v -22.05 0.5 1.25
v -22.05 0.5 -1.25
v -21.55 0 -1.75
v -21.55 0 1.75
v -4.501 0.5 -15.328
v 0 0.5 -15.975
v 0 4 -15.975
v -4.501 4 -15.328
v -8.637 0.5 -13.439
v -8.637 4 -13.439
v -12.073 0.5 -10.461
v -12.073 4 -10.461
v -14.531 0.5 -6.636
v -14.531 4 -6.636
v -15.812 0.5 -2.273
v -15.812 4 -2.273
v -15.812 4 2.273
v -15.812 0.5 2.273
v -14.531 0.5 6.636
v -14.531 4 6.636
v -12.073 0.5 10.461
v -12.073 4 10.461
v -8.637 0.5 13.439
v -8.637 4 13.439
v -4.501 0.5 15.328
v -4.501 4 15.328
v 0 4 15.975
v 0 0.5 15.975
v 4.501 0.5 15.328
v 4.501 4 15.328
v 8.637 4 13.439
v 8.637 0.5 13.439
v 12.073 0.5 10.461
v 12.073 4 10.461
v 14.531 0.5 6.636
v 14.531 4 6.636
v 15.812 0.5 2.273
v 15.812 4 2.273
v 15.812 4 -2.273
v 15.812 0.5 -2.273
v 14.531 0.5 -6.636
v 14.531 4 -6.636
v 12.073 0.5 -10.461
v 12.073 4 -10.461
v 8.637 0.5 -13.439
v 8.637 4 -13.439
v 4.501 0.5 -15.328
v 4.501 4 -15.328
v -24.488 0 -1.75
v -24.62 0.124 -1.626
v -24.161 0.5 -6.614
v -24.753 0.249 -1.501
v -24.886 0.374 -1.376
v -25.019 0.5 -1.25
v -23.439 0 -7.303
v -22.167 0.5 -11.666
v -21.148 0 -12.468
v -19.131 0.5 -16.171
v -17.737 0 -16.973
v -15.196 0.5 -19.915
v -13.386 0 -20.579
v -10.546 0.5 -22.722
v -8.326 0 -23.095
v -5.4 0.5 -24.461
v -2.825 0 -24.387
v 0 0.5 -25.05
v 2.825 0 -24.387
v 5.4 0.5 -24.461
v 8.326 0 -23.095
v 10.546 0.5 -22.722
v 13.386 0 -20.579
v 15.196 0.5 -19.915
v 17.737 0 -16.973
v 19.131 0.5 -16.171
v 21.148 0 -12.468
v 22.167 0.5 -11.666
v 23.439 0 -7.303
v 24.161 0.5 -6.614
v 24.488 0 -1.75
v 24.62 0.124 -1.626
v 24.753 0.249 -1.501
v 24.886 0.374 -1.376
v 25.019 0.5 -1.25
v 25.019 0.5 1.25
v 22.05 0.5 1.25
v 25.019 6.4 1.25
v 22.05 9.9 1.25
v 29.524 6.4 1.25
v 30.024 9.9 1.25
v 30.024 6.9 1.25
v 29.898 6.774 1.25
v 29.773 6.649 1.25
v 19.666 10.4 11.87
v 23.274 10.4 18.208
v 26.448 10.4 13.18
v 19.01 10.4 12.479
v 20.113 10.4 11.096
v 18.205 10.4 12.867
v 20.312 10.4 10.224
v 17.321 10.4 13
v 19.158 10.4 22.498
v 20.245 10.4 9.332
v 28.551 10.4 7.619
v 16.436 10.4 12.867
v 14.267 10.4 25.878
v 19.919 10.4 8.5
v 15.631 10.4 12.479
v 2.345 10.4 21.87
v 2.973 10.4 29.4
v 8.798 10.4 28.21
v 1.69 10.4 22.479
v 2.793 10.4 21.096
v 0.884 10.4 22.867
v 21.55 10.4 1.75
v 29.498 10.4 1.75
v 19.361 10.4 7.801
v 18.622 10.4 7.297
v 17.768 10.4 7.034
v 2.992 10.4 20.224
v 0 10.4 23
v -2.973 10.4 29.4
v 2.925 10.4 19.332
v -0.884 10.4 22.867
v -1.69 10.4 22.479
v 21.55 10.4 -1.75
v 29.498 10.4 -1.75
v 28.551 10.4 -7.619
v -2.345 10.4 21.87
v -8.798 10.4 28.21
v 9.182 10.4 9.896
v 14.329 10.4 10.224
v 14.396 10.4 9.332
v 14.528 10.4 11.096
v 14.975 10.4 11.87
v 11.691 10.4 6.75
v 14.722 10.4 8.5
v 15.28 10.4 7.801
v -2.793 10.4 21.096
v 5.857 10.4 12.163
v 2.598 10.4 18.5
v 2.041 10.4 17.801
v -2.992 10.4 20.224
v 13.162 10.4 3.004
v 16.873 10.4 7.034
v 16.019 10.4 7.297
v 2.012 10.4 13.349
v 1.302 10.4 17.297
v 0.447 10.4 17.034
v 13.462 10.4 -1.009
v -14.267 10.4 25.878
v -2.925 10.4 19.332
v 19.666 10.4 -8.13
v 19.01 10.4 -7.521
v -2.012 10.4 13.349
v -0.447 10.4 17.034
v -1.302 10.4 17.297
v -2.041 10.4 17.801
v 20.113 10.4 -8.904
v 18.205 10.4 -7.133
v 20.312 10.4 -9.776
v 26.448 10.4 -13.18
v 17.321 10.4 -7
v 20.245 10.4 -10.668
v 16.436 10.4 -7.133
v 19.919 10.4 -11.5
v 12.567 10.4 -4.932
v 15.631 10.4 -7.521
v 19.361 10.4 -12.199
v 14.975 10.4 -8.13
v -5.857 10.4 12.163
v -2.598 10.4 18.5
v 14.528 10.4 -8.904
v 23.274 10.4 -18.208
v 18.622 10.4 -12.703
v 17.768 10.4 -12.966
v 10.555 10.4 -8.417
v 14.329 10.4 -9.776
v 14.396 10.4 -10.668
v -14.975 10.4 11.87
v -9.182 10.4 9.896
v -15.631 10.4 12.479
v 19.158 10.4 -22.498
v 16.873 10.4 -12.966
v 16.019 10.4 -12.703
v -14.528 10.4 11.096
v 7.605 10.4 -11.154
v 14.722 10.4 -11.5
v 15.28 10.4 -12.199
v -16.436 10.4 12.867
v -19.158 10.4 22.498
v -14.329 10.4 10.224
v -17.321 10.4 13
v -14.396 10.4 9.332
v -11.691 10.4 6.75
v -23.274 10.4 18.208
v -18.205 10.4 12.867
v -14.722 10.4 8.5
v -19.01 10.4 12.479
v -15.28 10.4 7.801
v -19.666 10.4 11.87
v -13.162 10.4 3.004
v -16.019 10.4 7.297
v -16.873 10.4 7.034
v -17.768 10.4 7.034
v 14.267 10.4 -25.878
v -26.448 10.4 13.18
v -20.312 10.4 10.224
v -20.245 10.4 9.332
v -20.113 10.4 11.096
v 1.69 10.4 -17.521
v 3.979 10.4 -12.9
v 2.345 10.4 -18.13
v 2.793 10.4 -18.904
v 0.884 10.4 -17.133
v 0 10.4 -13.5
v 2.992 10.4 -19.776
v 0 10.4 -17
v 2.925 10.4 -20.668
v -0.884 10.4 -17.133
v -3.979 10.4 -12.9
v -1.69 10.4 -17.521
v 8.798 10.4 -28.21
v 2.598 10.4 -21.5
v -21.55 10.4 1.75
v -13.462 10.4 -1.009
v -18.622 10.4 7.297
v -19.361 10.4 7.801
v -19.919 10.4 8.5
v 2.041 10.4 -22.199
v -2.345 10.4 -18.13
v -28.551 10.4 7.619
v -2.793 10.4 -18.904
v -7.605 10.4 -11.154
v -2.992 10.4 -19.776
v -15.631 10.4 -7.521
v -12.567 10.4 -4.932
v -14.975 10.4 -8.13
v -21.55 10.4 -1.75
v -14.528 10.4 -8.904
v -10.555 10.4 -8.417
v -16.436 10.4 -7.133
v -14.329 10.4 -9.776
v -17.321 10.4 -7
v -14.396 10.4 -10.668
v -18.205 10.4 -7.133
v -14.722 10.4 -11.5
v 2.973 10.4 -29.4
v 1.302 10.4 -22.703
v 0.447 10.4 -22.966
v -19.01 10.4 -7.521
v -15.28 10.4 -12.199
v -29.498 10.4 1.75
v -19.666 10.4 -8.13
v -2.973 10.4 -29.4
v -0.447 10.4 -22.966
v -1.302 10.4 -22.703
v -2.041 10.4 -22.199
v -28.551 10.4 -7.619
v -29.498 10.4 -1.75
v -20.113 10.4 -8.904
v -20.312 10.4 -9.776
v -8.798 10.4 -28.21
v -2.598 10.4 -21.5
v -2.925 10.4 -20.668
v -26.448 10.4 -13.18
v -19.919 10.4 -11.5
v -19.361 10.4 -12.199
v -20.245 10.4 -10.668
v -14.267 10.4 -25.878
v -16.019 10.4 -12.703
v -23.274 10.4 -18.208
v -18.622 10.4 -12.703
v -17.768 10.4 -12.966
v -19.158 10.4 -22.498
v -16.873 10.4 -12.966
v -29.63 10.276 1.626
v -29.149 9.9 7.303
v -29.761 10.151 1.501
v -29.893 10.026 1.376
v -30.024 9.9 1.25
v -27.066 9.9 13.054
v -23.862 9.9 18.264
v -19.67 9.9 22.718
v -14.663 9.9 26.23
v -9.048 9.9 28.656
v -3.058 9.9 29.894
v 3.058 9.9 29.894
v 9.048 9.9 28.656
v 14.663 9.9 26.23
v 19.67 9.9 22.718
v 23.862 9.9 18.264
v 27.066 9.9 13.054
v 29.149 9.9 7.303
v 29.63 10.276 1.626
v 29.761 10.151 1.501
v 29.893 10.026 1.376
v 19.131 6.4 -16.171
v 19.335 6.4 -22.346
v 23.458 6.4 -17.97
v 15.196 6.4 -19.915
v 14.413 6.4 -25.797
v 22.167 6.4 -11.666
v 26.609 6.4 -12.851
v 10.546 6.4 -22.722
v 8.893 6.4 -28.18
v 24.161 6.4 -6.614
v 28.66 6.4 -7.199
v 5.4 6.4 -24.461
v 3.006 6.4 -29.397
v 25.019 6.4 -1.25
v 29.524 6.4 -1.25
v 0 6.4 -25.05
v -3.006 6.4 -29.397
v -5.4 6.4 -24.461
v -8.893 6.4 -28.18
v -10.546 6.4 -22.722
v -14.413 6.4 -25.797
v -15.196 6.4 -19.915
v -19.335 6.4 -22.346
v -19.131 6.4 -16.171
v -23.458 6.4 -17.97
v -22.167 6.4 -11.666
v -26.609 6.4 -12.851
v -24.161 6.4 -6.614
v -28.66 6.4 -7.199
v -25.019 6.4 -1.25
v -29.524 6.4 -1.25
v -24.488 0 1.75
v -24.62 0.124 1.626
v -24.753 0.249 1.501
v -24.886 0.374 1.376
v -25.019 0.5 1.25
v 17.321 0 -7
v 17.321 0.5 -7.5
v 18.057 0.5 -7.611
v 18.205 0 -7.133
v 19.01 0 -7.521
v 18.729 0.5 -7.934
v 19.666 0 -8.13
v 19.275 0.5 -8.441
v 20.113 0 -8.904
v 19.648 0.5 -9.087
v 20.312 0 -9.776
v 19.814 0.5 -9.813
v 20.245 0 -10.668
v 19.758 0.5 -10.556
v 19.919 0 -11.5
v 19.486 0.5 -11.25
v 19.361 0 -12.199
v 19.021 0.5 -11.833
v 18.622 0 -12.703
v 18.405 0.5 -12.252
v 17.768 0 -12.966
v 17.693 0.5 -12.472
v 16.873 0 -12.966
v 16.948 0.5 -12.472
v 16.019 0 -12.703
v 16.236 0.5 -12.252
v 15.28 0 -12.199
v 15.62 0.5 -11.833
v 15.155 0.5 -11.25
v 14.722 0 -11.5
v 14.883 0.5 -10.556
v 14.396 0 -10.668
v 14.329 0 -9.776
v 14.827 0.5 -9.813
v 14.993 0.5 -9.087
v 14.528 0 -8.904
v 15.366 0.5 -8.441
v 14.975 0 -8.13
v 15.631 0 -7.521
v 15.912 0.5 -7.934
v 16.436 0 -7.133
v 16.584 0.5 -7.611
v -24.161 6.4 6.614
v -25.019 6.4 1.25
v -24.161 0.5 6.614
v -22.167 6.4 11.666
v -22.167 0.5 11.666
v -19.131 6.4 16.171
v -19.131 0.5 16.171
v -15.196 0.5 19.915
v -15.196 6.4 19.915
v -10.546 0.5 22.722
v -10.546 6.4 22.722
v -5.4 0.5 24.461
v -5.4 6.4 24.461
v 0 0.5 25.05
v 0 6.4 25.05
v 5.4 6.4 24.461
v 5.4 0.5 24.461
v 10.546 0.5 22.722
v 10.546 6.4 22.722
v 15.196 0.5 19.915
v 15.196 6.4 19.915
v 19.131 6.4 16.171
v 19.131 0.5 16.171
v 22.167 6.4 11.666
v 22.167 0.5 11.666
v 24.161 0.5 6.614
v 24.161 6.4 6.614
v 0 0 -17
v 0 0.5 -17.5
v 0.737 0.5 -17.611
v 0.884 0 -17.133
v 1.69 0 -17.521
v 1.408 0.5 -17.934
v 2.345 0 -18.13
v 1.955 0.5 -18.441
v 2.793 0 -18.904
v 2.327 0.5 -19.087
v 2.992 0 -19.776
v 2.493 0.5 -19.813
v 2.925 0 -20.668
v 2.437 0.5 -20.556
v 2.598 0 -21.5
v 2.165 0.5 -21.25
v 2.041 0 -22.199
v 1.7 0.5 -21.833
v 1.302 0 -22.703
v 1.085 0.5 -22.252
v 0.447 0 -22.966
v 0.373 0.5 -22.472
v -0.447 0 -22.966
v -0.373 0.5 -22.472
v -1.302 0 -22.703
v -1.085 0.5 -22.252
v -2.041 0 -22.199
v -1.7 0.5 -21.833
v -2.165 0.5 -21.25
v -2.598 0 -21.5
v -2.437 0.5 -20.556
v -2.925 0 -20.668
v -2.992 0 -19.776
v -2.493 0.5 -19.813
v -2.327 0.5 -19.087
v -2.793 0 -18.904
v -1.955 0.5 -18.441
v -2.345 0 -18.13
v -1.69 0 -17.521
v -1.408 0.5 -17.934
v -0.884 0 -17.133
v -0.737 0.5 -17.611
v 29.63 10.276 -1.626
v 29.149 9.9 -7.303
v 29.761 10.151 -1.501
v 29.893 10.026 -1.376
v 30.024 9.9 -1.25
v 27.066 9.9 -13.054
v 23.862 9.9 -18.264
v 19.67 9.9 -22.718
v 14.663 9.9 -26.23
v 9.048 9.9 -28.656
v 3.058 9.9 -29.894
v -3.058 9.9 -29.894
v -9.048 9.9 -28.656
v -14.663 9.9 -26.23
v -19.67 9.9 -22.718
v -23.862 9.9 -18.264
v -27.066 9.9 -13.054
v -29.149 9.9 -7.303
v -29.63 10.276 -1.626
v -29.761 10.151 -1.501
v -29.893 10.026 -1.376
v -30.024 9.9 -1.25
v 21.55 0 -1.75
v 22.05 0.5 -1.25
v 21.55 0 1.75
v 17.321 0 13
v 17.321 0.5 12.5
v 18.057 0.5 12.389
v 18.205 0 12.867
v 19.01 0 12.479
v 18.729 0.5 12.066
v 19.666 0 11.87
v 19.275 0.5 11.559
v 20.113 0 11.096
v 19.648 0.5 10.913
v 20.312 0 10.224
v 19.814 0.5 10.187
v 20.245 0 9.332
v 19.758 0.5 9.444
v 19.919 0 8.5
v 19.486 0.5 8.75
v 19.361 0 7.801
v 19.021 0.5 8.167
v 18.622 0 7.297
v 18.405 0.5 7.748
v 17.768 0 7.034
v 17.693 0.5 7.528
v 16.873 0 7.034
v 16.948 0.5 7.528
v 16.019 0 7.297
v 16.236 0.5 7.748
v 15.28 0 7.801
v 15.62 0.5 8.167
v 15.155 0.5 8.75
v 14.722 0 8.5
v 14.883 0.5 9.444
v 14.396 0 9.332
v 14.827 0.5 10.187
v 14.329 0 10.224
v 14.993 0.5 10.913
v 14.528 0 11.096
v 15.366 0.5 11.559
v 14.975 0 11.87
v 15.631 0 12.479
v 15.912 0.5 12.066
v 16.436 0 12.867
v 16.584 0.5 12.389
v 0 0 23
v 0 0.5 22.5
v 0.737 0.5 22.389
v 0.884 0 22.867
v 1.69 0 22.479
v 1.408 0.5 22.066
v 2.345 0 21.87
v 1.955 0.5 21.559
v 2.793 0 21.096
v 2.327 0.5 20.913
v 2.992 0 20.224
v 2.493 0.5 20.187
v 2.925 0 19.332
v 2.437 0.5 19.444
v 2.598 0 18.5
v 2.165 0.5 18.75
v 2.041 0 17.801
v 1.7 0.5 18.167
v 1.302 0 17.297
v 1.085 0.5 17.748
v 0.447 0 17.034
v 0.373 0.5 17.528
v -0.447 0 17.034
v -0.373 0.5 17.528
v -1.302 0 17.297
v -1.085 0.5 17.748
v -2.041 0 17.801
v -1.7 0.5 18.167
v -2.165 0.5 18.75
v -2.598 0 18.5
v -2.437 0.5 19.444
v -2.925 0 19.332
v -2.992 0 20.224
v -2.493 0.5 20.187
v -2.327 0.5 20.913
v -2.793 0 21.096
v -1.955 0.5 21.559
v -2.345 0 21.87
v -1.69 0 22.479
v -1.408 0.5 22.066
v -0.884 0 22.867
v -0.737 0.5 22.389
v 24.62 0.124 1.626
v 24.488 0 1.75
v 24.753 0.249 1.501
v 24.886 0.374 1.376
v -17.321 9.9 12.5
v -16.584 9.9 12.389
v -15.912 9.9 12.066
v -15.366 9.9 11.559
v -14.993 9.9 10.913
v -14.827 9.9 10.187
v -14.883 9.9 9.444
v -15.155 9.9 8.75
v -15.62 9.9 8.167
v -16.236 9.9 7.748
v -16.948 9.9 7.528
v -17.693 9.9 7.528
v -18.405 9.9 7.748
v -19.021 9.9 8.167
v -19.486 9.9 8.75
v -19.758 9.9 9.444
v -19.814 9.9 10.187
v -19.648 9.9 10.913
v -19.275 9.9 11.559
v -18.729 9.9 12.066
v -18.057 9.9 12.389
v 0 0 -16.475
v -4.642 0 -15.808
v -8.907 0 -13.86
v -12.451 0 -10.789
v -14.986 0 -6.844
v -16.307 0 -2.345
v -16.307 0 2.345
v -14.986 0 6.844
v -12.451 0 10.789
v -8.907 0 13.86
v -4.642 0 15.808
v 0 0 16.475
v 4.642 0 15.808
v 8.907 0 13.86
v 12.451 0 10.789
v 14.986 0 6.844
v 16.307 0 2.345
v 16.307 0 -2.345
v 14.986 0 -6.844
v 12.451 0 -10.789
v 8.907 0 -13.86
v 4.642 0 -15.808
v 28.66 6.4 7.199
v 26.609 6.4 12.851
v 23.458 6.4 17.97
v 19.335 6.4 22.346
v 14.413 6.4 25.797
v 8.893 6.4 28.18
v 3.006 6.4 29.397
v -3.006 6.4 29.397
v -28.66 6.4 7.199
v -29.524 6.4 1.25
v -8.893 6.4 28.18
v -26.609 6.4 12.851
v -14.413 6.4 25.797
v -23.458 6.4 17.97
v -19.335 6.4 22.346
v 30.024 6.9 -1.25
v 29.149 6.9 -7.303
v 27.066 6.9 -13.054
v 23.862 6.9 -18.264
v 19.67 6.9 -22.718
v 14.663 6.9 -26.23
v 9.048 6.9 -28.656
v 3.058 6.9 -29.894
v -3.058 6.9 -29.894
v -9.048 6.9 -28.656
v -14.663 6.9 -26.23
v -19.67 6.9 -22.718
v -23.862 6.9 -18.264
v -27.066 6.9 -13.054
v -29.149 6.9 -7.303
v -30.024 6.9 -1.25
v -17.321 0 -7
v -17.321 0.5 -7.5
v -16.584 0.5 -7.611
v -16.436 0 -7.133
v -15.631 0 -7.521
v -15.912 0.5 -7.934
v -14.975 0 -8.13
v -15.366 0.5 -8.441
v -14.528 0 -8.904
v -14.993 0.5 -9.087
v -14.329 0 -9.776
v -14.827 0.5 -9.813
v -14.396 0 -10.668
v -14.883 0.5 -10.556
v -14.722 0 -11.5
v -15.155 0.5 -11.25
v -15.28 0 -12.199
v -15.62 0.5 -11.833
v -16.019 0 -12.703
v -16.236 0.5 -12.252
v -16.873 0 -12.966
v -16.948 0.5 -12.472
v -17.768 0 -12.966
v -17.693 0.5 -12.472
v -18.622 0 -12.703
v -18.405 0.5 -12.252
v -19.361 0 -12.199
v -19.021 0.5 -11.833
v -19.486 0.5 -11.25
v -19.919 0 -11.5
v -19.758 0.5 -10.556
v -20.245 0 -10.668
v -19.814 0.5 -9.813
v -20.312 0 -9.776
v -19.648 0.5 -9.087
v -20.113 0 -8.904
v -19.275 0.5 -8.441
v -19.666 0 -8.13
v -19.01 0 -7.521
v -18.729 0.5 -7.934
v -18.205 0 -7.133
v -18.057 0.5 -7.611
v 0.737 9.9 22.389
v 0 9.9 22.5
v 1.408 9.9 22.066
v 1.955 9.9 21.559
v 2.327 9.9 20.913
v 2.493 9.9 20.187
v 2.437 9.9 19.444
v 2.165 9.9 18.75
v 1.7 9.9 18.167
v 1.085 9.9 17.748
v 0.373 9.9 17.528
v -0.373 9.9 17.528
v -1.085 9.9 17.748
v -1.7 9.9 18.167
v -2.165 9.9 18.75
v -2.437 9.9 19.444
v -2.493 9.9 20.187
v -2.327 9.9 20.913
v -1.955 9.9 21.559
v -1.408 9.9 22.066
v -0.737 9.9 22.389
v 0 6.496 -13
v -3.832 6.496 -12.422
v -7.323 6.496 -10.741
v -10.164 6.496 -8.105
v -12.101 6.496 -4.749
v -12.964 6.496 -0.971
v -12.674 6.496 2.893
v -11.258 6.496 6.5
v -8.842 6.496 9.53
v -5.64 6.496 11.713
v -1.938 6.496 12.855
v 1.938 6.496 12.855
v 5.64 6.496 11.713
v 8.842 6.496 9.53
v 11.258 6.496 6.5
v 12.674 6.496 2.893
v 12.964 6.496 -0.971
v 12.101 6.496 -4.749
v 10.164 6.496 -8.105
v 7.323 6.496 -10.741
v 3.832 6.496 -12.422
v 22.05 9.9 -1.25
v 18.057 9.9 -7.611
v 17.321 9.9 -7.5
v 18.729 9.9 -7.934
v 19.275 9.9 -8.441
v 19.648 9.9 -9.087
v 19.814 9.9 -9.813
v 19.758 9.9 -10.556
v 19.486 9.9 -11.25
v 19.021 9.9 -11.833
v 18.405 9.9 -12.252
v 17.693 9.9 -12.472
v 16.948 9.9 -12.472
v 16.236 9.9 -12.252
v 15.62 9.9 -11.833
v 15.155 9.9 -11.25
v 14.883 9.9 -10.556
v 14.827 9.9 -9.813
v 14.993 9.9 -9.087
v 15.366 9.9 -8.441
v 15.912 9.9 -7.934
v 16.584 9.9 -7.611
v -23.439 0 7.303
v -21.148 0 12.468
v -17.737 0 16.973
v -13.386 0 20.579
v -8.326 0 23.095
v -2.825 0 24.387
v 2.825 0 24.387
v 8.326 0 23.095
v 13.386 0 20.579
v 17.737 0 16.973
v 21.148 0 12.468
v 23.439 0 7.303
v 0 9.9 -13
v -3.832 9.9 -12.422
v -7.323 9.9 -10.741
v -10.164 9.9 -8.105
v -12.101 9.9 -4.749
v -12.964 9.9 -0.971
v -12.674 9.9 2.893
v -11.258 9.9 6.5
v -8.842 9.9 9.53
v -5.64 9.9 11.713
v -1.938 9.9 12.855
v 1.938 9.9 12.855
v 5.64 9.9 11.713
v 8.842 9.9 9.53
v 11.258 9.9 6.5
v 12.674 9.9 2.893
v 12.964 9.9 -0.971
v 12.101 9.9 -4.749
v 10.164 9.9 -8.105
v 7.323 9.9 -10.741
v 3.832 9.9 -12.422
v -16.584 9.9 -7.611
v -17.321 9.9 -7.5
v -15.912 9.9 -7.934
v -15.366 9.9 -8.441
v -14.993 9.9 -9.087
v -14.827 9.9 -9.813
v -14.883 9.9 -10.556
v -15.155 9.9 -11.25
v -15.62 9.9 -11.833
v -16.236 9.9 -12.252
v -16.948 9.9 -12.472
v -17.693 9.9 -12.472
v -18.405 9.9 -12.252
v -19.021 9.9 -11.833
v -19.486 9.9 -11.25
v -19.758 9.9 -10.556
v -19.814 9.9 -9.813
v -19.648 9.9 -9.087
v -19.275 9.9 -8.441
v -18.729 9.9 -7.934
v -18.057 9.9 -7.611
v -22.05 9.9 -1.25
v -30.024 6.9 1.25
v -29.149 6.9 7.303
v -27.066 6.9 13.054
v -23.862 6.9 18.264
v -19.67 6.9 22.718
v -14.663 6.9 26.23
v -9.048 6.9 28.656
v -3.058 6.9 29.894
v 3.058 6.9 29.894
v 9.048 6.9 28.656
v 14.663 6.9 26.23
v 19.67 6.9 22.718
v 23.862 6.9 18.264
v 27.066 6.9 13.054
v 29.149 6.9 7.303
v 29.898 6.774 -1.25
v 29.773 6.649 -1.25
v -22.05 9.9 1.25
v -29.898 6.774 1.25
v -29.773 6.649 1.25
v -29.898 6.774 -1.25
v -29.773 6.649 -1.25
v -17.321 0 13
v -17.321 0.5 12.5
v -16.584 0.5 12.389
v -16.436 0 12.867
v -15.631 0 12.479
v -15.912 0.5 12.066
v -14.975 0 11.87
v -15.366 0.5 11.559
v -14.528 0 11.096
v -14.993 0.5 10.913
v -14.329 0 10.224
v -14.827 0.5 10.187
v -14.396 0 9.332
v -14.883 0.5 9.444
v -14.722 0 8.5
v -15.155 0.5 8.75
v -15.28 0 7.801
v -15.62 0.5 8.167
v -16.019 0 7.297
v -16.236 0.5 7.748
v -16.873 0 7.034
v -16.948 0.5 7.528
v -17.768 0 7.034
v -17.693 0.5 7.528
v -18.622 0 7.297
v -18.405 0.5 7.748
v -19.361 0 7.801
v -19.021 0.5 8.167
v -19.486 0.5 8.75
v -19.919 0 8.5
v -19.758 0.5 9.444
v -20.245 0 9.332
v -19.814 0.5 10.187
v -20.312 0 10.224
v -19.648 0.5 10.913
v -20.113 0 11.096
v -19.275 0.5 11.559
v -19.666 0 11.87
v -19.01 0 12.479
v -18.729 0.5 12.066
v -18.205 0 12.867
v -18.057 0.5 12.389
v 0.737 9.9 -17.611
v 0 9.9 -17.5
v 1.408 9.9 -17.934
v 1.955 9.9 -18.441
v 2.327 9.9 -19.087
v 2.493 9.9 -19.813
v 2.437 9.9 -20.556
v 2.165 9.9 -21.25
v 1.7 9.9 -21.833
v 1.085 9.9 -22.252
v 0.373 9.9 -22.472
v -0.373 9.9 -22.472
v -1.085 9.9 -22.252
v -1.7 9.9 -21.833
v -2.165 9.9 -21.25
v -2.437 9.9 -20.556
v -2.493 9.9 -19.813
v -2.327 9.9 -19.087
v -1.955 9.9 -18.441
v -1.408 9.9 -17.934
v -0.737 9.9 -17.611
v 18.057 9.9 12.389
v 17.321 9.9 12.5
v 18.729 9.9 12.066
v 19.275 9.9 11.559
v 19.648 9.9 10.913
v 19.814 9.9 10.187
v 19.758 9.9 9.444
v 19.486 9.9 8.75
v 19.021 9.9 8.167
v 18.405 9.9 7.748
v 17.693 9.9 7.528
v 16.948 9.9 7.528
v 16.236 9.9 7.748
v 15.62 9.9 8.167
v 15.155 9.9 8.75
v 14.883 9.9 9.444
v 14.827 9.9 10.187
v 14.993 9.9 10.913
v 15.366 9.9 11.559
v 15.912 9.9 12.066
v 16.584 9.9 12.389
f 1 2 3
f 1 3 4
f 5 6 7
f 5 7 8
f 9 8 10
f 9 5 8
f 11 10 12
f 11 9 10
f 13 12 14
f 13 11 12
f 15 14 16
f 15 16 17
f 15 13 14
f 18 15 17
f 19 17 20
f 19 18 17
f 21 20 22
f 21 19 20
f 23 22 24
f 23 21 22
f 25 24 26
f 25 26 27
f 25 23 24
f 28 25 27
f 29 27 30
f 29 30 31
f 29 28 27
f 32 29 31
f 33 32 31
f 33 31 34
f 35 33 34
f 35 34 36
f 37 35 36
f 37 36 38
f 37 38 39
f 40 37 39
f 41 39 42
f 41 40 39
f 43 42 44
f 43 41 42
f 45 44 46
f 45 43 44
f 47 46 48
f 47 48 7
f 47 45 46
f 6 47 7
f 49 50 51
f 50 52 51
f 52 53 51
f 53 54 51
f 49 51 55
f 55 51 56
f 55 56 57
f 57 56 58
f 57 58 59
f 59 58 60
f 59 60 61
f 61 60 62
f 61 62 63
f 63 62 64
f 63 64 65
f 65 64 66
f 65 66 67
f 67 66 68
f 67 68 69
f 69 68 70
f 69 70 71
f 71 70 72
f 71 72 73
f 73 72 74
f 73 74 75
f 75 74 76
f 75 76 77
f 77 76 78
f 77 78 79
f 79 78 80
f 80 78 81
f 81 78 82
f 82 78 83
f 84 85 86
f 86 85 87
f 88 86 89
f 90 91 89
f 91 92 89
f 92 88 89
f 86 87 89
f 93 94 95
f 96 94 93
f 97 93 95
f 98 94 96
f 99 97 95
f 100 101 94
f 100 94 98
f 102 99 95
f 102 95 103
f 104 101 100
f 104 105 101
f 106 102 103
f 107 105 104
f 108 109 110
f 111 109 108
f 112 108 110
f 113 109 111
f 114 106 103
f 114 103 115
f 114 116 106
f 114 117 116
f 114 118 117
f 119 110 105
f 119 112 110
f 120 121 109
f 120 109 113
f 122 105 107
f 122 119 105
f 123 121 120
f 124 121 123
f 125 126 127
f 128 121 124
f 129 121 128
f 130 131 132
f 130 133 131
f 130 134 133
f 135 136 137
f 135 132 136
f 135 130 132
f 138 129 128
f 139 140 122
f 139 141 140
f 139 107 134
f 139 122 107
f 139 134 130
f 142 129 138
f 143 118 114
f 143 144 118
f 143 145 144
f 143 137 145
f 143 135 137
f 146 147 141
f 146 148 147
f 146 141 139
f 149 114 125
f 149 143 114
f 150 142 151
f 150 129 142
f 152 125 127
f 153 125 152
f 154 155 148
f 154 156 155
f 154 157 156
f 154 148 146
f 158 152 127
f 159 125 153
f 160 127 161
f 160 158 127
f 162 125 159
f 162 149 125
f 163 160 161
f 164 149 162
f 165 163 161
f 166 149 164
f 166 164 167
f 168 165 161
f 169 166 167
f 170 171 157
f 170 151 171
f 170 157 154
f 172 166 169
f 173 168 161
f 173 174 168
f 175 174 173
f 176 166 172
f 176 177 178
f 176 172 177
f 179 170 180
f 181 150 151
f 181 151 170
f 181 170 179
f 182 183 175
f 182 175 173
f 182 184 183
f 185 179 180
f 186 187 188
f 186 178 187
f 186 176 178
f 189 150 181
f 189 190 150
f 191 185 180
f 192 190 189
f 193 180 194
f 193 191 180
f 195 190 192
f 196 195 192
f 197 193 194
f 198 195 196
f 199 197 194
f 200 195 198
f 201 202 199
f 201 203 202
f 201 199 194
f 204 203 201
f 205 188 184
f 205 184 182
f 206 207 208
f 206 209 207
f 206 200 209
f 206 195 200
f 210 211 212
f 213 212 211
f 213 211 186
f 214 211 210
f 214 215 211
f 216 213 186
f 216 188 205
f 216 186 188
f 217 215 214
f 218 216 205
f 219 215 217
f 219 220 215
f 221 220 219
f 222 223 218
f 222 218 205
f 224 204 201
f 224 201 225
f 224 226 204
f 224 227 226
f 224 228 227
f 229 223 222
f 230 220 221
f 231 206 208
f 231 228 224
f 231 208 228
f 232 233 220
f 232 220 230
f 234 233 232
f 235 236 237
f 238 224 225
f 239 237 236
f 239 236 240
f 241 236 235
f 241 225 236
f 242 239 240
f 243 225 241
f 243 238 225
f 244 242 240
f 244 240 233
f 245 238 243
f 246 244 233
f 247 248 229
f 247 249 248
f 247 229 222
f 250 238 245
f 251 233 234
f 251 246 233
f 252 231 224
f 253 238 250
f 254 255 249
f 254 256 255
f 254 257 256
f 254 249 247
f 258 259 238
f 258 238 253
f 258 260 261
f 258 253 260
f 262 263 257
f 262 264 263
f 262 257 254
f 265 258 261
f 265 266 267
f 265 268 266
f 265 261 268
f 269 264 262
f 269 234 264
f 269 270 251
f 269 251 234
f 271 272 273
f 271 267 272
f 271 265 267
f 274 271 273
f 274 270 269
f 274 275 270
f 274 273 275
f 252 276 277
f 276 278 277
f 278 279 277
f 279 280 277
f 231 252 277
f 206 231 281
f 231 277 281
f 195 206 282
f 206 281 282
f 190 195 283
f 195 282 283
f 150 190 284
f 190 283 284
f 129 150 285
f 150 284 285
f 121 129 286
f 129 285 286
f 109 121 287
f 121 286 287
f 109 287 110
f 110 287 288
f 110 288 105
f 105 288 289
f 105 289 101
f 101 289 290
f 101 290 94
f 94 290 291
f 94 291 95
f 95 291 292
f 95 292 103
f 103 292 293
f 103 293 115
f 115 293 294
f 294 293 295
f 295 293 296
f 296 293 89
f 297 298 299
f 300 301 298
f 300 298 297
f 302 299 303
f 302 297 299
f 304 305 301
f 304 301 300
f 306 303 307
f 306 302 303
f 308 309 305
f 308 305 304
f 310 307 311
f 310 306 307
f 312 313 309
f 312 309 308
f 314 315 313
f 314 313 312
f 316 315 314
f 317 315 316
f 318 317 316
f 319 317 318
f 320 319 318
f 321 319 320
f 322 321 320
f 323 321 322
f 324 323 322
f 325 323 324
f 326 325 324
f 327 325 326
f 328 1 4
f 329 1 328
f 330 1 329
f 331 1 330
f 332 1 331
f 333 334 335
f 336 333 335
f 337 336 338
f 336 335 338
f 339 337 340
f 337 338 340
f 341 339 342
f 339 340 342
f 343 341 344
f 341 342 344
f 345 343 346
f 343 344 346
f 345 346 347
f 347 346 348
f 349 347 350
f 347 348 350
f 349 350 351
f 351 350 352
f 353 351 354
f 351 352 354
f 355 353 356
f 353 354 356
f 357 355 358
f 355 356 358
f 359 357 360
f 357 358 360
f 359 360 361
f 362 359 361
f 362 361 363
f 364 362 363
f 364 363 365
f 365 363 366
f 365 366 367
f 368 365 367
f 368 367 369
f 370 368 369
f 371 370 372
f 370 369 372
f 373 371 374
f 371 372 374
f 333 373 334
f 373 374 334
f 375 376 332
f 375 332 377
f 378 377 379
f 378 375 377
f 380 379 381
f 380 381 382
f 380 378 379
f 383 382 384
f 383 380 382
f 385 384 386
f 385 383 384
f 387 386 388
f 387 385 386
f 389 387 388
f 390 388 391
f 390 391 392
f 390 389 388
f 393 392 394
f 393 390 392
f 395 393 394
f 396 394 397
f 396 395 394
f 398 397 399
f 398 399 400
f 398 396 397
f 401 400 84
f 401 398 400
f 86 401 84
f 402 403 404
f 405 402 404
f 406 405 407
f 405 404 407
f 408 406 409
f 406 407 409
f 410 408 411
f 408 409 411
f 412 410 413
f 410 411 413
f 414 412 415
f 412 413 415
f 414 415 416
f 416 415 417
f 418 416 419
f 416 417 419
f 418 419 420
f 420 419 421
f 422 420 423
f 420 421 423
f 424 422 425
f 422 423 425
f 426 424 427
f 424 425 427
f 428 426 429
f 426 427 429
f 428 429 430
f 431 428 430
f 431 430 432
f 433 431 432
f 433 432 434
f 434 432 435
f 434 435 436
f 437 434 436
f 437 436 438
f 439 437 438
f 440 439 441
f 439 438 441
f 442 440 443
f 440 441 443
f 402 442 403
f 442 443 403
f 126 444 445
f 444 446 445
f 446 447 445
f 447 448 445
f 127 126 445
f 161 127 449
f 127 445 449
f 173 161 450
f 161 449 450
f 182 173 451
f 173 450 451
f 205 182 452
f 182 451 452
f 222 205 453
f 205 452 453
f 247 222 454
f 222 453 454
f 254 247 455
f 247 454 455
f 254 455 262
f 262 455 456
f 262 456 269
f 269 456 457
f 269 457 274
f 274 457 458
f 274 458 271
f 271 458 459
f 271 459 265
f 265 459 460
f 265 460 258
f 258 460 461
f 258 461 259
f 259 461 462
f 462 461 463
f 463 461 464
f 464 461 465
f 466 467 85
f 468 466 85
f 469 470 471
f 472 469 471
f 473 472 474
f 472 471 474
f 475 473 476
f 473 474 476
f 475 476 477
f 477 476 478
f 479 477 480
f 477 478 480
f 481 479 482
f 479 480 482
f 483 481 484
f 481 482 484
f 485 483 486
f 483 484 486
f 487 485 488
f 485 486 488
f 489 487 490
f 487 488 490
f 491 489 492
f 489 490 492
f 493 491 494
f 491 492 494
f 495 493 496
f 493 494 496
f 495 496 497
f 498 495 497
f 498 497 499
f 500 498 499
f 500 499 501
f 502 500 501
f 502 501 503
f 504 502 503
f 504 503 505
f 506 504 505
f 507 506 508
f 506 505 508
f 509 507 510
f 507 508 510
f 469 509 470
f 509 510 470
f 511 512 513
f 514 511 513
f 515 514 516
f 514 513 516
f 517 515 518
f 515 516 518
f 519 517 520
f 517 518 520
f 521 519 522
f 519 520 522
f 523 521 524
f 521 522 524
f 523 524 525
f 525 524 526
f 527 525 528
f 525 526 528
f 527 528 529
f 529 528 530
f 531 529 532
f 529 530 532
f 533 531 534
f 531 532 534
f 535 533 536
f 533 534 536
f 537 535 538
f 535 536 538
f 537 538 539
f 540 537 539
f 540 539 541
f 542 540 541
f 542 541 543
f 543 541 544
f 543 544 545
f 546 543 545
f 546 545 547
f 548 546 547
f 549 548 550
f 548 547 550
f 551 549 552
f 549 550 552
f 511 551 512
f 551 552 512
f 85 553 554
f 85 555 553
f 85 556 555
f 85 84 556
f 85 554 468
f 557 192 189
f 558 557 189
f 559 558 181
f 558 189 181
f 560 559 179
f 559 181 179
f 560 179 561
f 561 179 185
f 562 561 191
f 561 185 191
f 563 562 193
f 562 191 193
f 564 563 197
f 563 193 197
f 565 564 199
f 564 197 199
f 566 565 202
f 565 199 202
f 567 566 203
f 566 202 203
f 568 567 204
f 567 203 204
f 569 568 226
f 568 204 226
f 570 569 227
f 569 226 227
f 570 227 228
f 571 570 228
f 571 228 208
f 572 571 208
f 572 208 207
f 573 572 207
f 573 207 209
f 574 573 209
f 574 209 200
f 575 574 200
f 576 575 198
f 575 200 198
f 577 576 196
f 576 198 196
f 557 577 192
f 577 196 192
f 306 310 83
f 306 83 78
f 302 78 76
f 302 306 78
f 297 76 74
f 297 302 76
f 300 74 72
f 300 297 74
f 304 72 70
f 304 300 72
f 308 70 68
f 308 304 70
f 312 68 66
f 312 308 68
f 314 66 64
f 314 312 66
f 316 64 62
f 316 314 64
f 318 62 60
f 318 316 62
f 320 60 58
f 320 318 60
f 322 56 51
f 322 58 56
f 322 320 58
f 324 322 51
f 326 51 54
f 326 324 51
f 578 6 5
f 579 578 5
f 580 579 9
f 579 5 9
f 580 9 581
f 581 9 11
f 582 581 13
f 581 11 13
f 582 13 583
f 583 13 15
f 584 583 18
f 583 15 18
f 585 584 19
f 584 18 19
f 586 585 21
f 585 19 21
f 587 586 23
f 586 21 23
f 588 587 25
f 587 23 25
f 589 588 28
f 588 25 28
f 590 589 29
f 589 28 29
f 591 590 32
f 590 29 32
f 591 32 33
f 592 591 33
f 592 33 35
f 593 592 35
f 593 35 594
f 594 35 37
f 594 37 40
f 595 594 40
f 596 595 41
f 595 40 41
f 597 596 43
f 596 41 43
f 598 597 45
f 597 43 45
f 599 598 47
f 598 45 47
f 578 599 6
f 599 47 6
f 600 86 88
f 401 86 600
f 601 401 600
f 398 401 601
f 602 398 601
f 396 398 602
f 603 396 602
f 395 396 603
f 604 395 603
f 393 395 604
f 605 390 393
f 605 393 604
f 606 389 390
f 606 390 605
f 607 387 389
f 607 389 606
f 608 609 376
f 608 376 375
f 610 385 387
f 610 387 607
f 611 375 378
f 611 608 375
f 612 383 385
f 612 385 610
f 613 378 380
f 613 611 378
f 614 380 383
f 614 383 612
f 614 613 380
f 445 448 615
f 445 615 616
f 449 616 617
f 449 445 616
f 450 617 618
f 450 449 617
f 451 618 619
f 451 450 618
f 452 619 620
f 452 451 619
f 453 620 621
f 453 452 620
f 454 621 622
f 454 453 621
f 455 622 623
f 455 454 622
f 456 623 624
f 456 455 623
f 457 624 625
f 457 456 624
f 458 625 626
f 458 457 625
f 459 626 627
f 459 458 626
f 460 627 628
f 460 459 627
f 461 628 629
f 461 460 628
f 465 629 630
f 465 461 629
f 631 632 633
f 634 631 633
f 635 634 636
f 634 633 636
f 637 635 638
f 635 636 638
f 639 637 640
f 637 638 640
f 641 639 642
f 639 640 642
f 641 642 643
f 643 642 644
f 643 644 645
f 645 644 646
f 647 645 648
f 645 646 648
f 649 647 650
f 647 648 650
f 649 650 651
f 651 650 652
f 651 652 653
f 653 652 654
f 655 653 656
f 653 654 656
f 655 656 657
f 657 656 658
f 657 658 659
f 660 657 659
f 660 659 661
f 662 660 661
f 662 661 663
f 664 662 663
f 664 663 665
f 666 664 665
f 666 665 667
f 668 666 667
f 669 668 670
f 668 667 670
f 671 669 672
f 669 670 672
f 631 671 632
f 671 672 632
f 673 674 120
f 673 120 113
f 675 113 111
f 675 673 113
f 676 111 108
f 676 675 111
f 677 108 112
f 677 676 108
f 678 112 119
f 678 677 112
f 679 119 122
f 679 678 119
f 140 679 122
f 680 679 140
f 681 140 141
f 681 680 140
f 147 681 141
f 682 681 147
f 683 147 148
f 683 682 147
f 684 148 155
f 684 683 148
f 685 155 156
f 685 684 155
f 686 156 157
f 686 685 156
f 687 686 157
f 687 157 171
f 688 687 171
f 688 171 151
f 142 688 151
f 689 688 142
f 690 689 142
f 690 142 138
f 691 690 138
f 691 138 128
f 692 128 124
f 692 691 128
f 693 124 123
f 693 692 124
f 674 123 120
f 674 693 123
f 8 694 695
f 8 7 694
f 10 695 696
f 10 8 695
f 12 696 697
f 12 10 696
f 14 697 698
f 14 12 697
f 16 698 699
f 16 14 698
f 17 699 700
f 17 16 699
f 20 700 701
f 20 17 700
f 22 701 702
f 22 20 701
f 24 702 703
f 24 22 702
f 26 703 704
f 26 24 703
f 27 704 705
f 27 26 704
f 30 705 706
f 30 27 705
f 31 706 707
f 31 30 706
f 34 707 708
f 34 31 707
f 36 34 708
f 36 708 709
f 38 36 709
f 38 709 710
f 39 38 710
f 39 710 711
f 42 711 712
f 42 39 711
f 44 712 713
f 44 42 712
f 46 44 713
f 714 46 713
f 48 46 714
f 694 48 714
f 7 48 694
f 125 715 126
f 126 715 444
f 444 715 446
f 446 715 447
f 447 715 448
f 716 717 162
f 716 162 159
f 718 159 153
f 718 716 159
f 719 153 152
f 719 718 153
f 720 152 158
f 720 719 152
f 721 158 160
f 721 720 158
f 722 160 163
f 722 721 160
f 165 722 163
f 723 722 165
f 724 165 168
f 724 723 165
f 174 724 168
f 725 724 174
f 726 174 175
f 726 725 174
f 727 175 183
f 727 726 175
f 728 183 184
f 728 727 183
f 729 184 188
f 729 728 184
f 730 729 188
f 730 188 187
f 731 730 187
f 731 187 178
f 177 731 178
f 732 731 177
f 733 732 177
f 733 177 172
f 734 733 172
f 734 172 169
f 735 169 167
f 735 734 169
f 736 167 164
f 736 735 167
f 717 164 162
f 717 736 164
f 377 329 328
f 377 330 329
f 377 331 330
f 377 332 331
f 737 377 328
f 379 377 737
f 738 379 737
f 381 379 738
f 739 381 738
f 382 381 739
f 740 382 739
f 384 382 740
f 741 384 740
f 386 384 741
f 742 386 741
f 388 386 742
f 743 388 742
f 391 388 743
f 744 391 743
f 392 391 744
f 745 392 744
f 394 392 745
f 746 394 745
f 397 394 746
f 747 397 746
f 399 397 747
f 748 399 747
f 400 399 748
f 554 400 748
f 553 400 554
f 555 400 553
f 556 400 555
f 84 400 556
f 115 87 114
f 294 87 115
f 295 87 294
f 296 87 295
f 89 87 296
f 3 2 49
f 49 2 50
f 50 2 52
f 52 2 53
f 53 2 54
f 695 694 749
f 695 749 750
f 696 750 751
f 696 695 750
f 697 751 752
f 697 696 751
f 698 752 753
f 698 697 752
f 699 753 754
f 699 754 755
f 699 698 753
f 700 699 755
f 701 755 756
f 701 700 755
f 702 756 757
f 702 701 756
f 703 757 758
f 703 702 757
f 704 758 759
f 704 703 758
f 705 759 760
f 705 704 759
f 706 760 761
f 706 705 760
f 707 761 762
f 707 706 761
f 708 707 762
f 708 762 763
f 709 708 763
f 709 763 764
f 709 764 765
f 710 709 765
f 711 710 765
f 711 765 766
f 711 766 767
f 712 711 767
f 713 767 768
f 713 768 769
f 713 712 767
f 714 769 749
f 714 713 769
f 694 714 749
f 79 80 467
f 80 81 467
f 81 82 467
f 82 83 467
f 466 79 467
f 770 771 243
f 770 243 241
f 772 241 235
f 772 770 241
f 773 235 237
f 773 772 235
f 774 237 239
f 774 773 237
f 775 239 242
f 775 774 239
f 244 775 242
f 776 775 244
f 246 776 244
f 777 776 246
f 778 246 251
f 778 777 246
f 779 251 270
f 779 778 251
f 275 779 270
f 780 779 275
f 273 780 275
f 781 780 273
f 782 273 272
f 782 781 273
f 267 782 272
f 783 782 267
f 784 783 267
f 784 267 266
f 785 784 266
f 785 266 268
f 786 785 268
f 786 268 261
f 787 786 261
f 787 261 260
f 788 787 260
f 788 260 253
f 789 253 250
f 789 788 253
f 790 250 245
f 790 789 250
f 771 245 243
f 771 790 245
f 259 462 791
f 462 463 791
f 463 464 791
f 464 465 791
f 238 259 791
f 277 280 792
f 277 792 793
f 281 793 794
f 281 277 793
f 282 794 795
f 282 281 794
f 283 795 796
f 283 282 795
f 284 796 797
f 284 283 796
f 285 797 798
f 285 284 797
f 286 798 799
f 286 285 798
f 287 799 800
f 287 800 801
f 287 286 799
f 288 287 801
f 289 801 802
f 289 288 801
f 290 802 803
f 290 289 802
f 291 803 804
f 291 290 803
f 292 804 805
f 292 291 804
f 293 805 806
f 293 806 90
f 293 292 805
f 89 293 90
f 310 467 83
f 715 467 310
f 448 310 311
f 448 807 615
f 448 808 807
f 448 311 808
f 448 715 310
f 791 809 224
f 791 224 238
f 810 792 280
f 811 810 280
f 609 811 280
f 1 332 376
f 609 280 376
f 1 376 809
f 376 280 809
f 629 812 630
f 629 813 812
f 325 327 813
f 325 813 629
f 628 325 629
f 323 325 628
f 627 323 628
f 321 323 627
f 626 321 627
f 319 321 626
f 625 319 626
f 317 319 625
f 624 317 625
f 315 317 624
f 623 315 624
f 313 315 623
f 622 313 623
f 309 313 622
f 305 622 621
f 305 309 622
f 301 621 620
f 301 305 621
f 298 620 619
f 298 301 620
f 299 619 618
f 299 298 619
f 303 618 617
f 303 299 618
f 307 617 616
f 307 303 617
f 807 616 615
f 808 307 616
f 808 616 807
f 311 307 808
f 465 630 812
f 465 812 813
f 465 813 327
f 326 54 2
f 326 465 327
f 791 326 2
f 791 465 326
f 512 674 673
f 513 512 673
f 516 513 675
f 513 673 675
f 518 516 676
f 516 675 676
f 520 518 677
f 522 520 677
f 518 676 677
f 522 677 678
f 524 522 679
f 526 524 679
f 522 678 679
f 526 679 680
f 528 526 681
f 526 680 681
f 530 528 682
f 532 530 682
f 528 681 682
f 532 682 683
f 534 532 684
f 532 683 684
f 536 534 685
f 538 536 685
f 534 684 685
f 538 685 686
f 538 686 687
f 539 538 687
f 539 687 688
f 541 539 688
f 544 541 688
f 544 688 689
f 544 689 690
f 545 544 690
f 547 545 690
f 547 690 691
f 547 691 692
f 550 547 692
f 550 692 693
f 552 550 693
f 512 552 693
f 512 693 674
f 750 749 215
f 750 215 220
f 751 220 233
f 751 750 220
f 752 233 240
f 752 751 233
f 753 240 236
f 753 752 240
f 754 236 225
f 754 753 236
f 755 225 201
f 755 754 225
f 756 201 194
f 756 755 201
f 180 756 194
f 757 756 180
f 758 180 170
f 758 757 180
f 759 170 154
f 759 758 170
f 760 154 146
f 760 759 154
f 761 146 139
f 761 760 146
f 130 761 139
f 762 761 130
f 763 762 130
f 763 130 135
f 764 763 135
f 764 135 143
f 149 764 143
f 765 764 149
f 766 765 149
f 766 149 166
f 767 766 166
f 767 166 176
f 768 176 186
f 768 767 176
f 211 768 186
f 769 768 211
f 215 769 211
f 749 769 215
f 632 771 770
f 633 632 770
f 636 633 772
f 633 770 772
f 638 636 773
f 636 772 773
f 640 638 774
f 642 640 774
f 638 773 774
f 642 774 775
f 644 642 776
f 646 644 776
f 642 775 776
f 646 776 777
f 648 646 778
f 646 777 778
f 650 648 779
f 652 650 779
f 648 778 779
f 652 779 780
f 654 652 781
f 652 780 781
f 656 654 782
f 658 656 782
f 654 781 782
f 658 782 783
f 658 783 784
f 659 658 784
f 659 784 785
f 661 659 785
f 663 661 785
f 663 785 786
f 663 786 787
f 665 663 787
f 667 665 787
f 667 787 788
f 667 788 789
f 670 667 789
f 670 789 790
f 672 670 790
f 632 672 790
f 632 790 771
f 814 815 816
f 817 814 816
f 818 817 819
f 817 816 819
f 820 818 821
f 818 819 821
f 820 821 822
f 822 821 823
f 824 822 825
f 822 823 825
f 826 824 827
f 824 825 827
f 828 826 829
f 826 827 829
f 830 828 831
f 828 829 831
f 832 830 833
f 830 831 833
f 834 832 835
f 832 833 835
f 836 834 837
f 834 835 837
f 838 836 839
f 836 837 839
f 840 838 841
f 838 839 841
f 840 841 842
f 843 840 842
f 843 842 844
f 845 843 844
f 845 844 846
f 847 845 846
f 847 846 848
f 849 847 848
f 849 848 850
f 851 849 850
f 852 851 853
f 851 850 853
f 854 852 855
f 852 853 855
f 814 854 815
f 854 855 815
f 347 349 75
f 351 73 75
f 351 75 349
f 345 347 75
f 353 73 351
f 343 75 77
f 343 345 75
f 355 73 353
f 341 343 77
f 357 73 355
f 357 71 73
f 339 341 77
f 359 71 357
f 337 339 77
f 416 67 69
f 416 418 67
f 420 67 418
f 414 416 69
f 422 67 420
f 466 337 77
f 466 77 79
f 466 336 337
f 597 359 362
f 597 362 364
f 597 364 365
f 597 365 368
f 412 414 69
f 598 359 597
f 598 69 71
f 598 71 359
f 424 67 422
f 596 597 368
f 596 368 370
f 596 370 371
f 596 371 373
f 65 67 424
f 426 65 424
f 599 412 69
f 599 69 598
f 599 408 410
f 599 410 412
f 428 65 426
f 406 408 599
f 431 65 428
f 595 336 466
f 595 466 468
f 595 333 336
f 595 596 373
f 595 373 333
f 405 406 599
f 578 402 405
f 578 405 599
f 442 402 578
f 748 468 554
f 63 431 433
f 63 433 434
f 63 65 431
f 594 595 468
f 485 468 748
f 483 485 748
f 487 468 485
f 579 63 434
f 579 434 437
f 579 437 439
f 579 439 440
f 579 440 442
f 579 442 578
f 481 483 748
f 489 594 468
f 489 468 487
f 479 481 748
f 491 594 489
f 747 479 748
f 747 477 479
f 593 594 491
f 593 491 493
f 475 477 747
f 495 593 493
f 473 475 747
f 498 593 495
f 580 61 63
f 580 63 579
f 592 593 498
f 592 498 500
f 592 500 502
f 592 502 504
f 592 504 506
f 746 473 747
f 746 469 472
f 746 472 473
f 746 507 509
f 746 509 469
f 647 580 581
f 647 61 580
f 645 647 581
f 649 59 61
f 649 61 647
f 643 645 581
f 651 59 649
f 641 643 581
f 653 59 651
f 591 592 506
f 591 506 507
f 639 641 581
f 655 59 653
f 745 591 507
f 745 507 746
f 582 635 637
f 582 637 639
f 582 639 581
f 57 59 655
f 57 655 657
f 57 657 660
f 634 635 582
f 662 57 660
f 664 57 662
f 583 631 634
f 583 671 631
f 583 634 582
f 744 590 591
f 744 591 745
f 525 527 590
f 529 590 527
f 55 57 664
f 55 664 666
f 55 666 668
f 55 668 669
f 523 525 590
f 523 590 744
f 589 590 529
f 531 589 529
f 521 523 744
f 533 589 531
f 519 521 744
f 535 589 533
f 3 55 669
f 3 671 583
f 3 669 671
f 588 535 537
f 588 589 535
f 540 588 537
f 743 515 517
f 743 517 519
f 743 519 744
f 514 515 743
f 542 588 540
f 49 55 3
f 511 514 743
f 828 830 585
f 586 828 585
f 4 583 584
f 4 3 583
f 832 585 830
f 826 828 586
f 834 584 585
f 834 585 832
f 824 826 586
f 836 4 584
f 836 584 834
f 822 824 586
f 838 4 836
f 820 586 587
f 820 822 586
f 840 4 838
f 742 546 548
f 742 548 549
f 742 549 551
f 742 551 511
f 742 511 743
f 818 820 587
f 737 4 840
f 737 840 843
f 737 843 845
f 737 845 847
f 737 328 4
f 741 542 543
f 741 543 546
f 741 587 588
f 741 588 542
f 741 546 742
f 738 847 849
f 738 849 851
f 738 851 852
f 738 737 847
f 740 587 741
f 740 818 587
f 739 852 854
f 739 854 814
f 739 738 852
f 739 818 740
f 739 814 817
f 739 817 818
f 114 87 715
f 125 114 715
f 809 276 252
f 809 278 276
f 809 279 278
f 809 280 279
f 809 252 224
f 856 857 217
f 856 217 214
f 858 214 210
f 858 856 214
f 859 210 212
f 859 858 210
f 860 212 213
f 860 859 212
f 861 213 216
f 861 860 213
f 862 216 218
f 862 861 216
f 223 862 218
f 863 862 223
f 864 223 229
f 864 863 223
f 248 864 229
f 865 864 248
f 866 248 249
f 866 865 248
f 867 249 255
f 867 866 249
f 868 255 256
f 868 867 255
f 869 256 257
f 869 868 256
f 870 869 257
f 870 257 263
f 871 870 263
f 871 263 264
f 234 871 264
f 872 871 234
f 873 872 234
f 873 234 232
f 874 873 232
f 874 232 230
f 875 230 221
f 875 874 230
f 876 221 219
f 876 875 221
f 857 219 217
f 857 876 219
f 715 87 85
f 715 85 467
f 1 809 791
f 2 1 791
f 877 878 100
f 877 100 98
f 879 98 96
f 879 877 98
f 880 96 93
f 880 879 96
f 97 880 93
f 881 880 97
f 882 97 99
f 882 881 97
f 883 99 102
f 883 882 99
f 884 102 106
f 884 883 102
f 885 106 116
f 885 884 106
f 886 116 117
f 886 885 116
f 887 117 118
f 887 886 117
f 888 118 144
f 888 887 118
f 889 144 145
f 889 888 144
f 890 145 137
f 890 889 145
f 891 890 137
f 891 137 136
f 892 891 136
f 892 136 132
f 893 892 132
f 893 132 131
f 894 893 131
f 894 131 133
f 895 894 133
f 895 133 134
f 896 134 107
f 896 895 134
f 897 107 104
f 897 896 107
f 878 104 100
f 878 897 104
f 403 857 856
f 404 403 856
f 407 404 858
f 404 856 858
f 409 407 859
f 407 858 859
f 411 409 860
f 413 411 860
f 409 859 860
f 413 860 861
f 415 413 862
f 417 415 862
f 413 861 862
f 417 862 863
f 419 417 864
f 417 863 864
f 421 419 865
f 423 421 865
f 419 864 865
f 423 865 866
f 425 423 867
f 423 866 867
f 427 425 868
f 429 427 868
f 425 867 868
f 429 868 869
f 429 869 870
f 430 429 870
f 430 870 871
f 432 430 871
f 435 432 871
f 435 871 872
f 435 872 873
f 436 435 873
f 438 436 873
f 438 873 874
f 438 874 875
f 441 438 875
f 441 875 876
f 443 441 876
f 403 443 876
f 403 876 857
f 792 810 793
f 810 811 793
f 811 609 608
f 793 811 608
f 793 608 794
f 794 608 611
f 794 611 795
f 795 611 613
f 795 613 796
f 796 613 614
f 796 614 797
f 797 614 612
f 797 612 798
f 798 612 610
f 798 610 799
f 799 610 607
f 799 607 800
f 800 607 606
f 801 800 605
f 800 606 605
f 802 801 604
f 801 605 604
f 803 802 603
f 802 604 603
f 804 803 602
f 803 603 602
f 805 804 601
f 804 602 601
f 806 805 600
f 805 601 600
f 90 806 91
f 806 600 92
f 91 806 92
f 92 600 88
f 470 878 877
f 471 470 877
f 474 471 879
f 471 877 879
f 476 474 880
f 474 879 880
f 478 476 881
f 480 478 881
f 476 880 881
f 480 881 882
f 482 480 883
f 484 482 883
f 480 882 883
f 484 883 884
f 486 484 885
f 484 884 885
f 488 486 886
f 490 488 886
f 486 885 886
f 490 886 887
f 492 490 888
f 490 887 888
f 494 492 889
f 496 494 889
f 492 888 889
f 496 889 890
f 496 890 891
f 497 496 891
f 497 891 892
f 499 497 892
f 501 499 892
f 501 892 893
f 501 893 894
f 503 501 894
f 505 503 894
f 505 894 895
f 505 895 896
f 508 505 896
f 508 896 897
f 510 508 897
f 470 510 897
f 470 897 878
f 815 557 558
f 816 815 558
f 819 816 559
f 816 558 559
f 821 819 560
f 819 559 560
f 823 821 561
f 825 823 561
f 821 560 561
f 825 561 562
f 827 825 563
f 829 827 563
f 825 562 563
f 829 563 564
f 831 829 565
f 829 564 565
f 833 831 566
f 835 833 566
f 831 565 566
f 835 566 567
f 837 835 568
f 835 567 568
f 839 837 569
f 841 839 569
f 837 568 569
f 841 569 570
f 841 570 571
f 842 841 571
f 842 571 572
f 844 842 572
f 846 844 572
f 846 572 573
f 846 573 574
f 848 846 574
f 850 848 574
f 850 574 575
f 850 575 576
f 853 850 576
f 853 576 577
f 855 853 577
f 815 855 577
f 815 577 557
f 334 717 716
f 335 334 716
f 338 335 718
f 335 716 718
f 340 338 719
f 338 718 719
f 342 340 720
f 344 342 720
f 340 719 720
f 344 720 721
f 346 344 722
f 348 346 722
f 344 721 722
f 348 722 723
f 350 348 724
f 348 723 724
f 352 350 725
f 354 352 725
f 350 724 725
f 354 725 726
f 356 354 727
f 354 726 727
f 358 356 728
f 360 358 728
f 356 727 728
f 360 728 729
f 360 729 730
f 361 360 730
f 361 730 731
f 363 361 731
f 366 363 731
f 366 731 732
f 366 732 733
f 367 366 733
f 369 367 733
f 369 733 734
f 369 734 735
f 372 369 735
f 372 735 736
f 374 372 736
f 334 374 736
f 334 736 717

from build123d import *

# Parameters (mm, degrees)
SKETCH2_R               = 2.5
CUT_EXTRUDE1_DEPTH      = 44.751171413
SKETCH3_W               = 8
SKETCH3_H               = 2.5
CUT_EXTRUDE_THIN1_DEPTH = 44.751171413
CHAMFER1_SIZE           = 0.5


with BuildPart() as part:
    # Sketch1 → Revolve1 (revolve)
    with BuildSketch(Plane.XY, mode=Mode.PRIVATE) as revolve1_sk:
        Polygon((-15.975, 0), (-25.05, 0), (-25.05, 6.4), (-30.05, 6.4), (-30.05, 10.4), (-13, 10.4), (-13, 6.496321403), (-15.975, 4), align=None)
    revolve(revolve1_sk.sketch.rotate(Axis((0, 0, 0), (0, 1, 0)), 270), axis=Axis((0, 0, 0), (0, 1, 0)))

    # Sketch2 → Cut-Extrude1 (cut, through all)
    with BuildSketch(Plane(origin=(0, 10.4, 0), x_dir=(1, 0, 0), z_dir=(0, 1, 0))):
        with Locations(Location((0, 20, 0), (0, 0, 270))):
            Circle(SKETCH2_R)
        with Locations(Location((17.320508076, 10, 0), (0, 0, 270))):
            Circle(SKETCH2_R)
        with Locations(Location((17.320508076, -10, 0), (0, 0, 270))):
            Circle(SKETCH2_R)
        with Locations(Location((0, -20, 0), (0, 0, 270))):
            Circle(SKETCH2_R)
        with Locations(Location((-17.320508076, -10, 0), (0, 0, 270))):
            Circle(SKETCH2_R)
        with Locations(Location((-17.320508076, 10, 0), (0, 0, 270))):
            Circle(SKETCH2_R)
    extrude(amount=-CUT_EXTRUDE1_DEPTH, mode=Mode.SUBTRACT)

    # Sketch3 → Cut-Extrude-Thin1 (cut, through all)
    with BuildSketch(Plane(origin=(0, 10.4, 0), x_dir=(1, 0, 0), z_dir=(0, 1, 0))):
        with Locations((-26.05, 0)):
            Rectangle(SKETCH3_W, SKETCH3_H)
        with Locations((26.05, 0)):
            Rectangle(SKETCH3_W, SKETCH3_H)
    extrude(amount=-CUT_EXTRUDE_THIN1_DEPTH, mode=Mode.SUBTRACT)

    # Chamfer1
    chamfer1_edges = [part.edges().sort_by_distance(p)[0] for p in [
        (0, 0, 15.975),
        (0, 0, -22.5),
        (0, 10.4, -22.5),
        (-17.320508076, 0, -12.5),
        (-17.320508076, 10.4, -12.5),
        (-17.320508076, 0, 7.5),
        (-17.320508076, 10.4, 7.5),
        (0, 0, 17.5),
        (0, 10.4, 17.5),
        (17.320508076, 0, 7.5),
        (17.320508076, 10.4, 7.5),
        (17.320508076, 0, -12.5),
        (17.320508076, 10.4, -12.5),
        (0, 10.4, 30.05),
        (0, 10.4, -30.05),
        (26.036995204, 10.4, 1.25),
        (26.036995204, 10.4, -1.25),
        (-26.036995204, 10.4, -1.25),
        (-26.036995204, 10.4, 1.25),
        (0, 6.4, 30.05),
        (0, 6.4, -30.05),
        (0, 0, 25.05),
        (0, 0, -25.05),
        (-23.534396468, 0, -1.25),
        (-22.05, 0, 0),
        (-23.534396468, 0, 1.25),
        (-22.05, 10.4, 0),
        (0, 10.4, 13),
        (23.534396468, 0, 1.25),
        (22.05, 0, 0),
        (23.534396468, 0, -1.25),
        (22.05, 10.4, 0),
    ]]
    chamfer(chamfer1_edges, length=CHAMFER1_SIZE)


solid = part.part
